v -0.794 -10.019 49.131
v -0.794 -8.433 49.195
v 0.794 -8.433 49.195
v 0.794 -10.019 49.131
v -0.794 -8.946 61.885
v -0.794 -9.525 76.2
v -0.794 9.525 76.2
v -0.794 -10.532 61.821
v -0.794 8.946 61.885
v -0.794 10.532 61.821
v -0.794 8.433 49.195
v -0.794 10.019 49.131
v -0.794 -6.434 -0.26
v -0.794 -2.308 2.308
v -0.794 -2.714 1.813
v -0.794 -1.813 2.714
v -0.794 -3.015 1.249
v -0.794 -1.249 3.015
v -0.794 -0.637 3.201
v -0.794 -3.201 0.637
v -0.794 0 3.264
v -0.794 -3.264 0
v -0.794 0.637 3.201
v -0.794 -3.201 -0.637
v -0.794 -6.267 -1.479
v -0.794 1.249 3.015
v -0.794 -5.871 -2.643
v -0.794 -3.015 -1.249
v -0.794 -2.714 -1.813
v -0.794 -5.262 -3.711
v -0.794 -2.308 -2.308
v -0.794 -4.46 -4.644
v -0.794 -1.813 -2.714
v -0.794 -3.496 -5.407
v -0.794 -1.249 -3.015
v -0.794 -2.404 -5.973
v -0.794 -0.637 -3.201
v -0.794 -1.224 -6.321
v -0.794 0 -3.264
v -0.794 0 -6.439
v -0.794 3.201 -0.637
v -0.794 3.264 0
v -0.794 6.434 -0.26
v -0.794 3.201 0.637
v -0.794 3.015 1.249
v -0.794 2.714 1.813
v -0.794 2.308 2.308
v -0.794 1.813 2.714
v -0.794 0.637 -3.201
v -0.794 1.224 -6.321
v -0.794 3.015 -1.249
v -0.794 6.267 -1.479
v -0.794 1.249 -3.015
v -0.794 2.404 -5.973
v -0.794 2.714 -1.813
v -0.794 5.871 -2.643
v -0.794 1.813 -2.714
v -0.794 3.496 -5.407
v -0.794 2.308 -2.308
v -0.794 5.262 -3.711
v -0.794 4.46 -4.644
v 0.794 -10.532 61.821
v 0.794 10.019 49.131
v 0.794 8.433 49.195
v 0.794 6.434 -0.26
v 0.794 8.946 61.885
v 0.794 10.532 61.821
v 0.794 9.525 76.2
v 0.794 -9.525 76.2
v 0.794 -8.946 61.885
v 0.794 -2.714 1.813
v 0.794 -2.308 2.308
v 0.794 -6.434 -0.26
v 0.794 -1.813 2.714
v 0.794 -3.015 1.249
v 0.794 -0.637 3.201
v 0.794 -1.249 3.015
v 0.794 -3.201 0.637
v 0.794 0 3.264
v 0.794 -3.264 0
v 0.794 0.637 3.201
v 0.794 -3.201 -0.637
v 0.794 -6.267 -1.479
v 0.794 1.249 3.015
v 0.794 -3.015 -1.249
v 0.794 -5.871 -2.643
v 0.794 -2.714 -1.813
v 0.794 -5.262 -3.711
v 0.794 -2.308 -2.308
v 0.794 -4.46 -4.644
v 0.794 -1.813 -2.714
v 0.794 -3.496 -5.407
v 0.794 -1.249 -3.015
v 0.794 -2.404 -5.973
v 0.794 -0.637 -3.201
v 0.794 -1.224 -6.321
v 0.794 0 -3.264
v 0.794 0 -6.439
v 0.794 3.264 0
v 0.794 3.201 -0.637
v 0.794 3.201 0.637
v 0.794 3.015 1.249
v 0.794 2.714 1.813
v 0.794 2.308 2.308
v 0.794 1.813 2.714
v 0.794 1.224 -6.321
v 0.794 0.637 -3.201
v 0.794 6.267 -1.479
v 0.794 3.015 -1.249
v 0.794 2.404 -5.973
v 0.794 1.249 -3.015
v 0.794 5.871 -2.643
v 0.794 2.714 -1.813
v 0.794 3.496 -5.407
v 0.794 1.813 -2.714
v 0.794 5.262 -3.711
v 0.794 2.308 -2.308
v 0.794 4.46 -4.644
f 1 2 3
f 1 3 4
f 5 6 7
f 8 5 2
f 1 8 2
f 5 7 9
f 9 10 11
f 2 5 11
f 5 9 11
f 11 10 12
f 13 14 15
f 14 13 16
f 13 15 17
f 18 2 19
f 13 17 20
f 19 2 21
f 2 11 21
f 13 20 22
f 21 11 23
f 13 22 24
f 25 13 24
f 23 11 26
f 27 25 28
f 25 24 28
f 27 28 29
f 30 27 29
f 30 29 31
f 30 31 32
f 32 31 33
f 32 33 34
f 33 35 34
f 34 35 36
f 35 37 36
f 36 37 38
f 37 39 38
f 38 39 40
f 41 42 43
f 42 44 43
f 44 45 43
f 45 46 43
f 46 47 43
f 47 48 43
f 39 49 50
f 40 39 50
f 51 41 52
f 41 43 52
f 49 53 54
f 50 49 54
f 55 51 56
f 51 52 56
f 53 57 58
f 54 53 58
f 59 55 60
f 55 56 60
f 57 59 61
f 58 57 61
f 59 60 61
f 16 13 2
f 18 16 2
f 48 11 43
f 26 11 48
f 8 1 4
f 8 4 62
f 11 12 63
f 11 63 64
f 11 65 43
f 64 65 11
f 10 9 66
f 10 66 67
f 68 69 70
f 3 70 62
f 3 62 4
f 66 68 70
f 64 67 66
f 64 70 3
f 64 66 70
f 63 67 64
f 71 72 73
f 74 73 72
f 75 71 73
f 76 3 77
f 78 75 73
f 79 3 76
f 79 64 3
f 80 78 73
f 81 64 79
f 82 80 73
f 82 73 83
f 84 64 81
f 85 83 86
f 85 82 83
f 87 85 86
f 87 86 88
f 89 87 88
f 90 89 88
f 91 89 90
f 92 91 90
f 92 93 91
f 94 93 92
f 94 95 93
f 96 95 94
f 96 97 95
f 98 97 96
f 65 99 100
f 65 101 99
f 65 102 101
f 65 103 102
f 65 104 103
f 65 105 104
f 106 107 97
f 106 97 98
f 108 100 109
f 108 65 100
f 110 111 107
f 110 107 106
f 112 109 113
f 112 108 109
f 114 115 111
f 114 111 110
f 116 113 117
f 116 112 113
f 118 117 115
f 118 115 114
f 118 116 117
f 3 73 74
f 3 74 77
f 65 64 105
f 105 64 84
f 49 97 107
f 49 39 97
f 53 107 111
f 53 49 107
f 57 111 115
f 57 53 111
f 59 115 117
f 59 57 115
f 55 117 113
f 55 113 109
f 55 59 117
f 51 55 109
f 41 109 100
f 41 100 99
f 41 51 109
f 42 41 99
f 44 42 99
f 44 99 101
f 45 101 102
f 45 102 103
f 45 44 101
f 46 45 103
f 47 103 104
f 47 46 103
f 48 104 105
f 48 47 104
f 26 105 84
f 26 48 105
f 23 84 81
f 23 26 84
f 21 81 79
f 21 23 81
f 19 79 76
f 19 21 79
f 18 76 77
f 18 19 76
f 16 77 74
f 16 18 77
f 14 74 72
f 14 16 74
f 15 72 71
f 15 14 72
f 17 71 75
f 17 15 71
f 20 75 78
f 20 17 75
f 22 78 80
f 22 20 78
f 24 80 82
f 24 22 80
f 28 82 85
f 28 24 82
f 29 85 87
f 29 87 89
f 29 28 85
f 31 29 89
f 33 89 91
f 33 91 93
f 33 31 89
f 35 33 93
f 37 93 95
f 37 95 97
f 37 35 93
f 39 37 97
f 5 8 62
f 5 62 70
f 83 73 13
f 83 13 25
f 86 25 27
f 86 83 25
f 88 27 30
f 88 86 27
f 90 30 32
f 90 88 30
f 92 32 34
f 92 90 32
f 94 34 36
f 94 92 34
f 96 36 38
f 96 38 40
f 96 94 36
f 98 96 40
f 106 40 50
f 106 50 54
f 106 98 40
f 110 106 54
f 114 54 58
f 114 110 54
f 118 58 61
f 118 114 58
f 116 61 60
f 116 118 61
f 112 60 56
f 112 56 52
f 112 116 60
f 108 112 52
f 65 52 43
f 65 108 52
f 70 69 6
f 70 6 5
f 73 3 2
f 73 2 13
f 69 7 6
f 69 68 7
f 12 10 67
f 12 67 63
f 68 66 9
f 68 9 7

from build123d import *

# Parameters (mm, degrees)
SKETCH1_R           = 3.2639
BOSS_EXTRUDE1_DEPTH = 0.79375
BOSS_EXTRUDE2_DEPTH = 1.5875


with BuildPart() as part:
    # Sketch1 → Boss-Extrude1 (new, symmetric)
    with BuildSketch(Plane(origin=(0, 0, 0), x_dir=(0, 0, -1), z_dir=(1, 0, 0))):
        with BuildLine():
            Line((-76.2, 9.525), (-76.2, -9.525))
            Line((-76.2, -9.525), (0.260118416, -6.433643728))
            ThreePointArc((0.260118416, -6.433643728), (6.4389, 0), (0.260118416, 6.433643728))
            Line((0.260118416, 6.433643728), (-76.2, 9.525))
        make_face()
        Circle(SKETCH1_R, mode=Mode.SUBTRACT)
    extrude(amount=BOSS_EXTRUDE1_DEPTH, both=True)

    # Sketch2 → Boss-Extrude2 (add)
    with BuildSketch(Plane.ZY.offset(0.79375)):
        Polygon((61.8850913, -8.946234446), (49.1954587, -8.433180371), (49.131326941, -10.019384446), (61.82095954, -10.532438521), align=None)
        Polygon((49.131326941, 10.019384446), (49.1954587, 8.433180371), (61.8850913, 8.946234446), (61.82095954, 10.532438521), align=None)
    extrude(amount=-BOSS_EXTRUDE2_DEPTH)


solid = part.part
